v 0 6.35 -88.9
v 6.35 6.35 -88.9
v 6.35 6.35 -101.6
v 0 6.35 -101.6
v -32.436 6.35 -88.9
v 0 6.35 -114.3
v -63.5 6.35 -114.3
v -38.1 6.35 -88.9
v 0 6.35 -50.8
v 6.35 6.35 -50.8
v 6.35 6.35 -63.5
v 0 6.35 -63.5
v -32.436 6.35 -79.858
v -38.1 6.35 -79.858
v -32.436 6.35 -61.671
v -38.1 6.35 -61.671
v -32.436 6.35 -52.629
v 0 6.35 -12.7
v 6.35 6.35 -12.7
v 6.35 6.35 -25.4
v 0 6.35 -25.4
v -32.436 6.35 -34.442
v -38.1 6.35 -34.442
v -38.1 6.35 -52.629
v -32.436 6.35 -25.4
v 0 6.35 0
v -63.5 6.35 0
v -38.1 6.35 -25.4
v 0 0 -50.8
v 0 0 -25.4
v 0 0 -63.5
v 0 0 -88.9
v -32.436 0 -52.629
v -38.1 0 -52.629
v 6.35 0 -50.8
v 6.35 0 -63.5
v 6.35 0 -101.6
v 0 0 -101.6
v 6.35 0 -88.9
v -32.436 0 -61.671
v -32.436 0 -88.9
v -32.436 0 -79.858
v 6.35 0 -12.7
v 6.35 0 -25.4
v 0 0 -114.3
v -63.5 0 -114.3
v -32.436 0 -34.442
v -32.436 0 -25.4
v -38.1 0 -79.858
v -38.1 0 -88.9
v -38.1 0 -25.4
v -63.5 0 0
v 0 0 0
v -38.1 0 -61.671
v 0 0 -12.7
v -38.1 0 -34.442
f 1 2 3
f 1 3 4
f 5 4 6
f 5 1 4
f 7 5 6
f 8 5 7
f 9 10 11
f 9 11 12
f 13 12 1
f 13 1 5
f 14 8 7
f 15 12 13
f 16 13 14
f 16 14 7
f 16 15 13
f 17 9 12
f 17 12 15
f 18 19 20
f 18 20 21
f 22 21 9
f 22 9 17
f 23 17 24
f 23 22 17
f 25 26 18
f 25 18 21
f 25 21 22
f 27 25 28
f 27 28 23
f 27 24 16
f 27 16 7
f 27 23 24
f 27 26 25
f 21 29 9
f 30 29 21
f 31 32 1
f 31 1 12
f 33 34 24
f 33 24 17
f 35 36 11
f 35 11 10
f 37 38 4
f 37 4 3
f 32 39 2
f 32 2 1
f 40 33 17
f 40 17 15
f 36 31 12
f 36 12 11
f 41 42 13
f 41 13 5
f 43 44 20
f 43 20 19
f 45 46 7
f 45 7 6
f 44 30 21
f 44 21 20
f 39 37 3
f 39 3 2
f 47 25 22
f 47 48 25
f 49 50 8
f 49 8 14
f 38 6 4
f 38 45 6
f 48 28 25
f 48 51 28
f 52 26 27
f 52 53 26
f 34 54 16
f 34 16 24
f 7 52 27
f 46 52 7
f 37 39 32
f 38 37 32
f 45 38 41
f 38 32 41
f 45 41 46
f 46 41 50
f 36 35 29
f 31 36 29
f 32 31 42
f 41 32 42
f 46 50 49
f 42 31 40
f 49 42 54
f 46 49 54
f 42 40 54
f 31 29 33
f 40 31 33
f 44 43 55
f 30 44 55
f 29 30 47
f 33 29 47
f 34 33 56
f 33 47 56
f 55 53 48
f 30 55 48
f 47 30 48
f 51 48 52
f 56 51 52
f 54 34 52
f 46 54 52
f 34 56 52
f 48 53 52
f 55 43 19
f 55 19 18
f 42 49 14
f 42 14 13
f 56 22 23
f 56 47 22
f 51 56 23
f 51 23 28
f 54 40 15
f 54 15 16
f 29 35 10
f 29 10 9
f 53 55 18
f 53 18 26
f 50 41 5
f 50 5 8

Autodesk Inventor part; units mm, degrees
ref_plane "YZ Plane" through (0, 0, 0) normal (1, 0, 0) x (0, 1, 0)
ref_plane "XZ Plane" through (0, 0, 0) normal (0, 1, 0) x (-1, 0, 0)
ref_plane "XY Plane" through (0, 0, 0) normal (0, 0, 1) x (1, 0, 0)
sketch "Sketch1" plane through (0, 0, 0) normal (0, 1, 0) x (-1, 0, 0)
  line L0 (0, 0) -> (63.5, 0)
  line L1 (63.5, 0) -> (63.5, -114.3)
  line L2 (63.5, -114.3) -> (0, -114.3)
  line L3 (0, -114.3) -> (0, 0)
  line L4 (38.1, -52.6288) -> (32.4358, -52.6288)
  line L5 (32.4358, -52.6288) -> (32.4358, -61.6712)
  line L6 (32.4358, -61.6712) -> (38.1, -61.6712)
  line L7 (38.1, -61.6712) -> (38.1, -52.6288)
  line L8 (38.1, -25.4) -> (32.4358, -25.4)
  line L9 (32.4358, -25.4) -> (32.4358, -34.4424)
  line L10 (32.4358, -34.4424) -> (38.1, -34.4424)
  line L11 (38.1, -34.4424) -> (38.1, -25.4)
  line L12 (38.1, -79.8576) -> (32.4358, -79.8576)
  line L13 (32.4358, -79.8576) -> (32.4358, -88.9)
  line L14 (32.4358, -88.9) -> (38.1, -88.9)
  line L15 (38.1, -88.9) -> (38.1, -79.8576)
  dimension "d0" = 63.5
  dimension "d1" = 114.3
  dimension "d2" = 5.6642
  dimension "d3" = 9.0424
  dimension "d4" = 5.6642
  dimension "d5" = 9.0424
  dimension "d8" = 5.6642
  dimension "d9" = 9.0424
  dimension "d10" = 25.4
  dimension "d11" = 25.4
  dimension "d12" = 25.4
  dimension "d13" = 25.4
  dimension "d14" = 25.4
  dimension "d15" = 45.4152
  dimension "d16" = 18.1864
  dimension "d17" = 18.1864
extrude "Extrusion1" add sketch "Sketch1" along normal blind 6.35
sketch "Sketch2" plane through (0, 0, 0) normal (0, -1, 0) x (1, 0, 0)
  line L0 (0, -101.6) -> (6.35, -101.6)
  line L1 (6.35, -101.6) -> (6.35, -88.9)
  line L2 (6.35, -88.9) -> (0, -88.9)
  line L3 (0, -88.9) -> (0, -101.6)
  line L4 (-63.5, -114.3) -> (0, -114.3) projected
  line L5 (0, 0) -> (0, -114.3) projected
  line L6 (0, -25.4) -> (6.35, -25.4)
  line L7 (6.35, -25.4) -> (6.35, -12.7)
  line L8 (6.35, -12.7) -> (0, -12.7)
  line L9 (0, -12.7) -> (0, -25.4)
  line L10 (0, -63.5) -> (6.35, -63.5)
  line L11 (6.35, -63.5) -> (6.35, -50.8)
  line L12 (6.35, -50.8) -> (0, -50.8)
  line L13 (0, -50.8) -> (0, -63.5)
  dimension "d20" = 6.35
  dimension "d21" = 12.7
  dimension "d22" = 12.7
  dimension "d23" = 6.35
  dimension "d24" = 12.7
  dimension "d25" = 12.7
  dimension "d26" = 6.35
  dimension "d27" = 12.7
  dimension "d28" = 63.5
  dimension "d29" = 25.4
extrude "Extrusion2" add sketch "Sketch2" against normal blind 6.35
equation "\"d11\" = d10"
equation "\"d12\" = d11"
properties part number "LEDFront"
